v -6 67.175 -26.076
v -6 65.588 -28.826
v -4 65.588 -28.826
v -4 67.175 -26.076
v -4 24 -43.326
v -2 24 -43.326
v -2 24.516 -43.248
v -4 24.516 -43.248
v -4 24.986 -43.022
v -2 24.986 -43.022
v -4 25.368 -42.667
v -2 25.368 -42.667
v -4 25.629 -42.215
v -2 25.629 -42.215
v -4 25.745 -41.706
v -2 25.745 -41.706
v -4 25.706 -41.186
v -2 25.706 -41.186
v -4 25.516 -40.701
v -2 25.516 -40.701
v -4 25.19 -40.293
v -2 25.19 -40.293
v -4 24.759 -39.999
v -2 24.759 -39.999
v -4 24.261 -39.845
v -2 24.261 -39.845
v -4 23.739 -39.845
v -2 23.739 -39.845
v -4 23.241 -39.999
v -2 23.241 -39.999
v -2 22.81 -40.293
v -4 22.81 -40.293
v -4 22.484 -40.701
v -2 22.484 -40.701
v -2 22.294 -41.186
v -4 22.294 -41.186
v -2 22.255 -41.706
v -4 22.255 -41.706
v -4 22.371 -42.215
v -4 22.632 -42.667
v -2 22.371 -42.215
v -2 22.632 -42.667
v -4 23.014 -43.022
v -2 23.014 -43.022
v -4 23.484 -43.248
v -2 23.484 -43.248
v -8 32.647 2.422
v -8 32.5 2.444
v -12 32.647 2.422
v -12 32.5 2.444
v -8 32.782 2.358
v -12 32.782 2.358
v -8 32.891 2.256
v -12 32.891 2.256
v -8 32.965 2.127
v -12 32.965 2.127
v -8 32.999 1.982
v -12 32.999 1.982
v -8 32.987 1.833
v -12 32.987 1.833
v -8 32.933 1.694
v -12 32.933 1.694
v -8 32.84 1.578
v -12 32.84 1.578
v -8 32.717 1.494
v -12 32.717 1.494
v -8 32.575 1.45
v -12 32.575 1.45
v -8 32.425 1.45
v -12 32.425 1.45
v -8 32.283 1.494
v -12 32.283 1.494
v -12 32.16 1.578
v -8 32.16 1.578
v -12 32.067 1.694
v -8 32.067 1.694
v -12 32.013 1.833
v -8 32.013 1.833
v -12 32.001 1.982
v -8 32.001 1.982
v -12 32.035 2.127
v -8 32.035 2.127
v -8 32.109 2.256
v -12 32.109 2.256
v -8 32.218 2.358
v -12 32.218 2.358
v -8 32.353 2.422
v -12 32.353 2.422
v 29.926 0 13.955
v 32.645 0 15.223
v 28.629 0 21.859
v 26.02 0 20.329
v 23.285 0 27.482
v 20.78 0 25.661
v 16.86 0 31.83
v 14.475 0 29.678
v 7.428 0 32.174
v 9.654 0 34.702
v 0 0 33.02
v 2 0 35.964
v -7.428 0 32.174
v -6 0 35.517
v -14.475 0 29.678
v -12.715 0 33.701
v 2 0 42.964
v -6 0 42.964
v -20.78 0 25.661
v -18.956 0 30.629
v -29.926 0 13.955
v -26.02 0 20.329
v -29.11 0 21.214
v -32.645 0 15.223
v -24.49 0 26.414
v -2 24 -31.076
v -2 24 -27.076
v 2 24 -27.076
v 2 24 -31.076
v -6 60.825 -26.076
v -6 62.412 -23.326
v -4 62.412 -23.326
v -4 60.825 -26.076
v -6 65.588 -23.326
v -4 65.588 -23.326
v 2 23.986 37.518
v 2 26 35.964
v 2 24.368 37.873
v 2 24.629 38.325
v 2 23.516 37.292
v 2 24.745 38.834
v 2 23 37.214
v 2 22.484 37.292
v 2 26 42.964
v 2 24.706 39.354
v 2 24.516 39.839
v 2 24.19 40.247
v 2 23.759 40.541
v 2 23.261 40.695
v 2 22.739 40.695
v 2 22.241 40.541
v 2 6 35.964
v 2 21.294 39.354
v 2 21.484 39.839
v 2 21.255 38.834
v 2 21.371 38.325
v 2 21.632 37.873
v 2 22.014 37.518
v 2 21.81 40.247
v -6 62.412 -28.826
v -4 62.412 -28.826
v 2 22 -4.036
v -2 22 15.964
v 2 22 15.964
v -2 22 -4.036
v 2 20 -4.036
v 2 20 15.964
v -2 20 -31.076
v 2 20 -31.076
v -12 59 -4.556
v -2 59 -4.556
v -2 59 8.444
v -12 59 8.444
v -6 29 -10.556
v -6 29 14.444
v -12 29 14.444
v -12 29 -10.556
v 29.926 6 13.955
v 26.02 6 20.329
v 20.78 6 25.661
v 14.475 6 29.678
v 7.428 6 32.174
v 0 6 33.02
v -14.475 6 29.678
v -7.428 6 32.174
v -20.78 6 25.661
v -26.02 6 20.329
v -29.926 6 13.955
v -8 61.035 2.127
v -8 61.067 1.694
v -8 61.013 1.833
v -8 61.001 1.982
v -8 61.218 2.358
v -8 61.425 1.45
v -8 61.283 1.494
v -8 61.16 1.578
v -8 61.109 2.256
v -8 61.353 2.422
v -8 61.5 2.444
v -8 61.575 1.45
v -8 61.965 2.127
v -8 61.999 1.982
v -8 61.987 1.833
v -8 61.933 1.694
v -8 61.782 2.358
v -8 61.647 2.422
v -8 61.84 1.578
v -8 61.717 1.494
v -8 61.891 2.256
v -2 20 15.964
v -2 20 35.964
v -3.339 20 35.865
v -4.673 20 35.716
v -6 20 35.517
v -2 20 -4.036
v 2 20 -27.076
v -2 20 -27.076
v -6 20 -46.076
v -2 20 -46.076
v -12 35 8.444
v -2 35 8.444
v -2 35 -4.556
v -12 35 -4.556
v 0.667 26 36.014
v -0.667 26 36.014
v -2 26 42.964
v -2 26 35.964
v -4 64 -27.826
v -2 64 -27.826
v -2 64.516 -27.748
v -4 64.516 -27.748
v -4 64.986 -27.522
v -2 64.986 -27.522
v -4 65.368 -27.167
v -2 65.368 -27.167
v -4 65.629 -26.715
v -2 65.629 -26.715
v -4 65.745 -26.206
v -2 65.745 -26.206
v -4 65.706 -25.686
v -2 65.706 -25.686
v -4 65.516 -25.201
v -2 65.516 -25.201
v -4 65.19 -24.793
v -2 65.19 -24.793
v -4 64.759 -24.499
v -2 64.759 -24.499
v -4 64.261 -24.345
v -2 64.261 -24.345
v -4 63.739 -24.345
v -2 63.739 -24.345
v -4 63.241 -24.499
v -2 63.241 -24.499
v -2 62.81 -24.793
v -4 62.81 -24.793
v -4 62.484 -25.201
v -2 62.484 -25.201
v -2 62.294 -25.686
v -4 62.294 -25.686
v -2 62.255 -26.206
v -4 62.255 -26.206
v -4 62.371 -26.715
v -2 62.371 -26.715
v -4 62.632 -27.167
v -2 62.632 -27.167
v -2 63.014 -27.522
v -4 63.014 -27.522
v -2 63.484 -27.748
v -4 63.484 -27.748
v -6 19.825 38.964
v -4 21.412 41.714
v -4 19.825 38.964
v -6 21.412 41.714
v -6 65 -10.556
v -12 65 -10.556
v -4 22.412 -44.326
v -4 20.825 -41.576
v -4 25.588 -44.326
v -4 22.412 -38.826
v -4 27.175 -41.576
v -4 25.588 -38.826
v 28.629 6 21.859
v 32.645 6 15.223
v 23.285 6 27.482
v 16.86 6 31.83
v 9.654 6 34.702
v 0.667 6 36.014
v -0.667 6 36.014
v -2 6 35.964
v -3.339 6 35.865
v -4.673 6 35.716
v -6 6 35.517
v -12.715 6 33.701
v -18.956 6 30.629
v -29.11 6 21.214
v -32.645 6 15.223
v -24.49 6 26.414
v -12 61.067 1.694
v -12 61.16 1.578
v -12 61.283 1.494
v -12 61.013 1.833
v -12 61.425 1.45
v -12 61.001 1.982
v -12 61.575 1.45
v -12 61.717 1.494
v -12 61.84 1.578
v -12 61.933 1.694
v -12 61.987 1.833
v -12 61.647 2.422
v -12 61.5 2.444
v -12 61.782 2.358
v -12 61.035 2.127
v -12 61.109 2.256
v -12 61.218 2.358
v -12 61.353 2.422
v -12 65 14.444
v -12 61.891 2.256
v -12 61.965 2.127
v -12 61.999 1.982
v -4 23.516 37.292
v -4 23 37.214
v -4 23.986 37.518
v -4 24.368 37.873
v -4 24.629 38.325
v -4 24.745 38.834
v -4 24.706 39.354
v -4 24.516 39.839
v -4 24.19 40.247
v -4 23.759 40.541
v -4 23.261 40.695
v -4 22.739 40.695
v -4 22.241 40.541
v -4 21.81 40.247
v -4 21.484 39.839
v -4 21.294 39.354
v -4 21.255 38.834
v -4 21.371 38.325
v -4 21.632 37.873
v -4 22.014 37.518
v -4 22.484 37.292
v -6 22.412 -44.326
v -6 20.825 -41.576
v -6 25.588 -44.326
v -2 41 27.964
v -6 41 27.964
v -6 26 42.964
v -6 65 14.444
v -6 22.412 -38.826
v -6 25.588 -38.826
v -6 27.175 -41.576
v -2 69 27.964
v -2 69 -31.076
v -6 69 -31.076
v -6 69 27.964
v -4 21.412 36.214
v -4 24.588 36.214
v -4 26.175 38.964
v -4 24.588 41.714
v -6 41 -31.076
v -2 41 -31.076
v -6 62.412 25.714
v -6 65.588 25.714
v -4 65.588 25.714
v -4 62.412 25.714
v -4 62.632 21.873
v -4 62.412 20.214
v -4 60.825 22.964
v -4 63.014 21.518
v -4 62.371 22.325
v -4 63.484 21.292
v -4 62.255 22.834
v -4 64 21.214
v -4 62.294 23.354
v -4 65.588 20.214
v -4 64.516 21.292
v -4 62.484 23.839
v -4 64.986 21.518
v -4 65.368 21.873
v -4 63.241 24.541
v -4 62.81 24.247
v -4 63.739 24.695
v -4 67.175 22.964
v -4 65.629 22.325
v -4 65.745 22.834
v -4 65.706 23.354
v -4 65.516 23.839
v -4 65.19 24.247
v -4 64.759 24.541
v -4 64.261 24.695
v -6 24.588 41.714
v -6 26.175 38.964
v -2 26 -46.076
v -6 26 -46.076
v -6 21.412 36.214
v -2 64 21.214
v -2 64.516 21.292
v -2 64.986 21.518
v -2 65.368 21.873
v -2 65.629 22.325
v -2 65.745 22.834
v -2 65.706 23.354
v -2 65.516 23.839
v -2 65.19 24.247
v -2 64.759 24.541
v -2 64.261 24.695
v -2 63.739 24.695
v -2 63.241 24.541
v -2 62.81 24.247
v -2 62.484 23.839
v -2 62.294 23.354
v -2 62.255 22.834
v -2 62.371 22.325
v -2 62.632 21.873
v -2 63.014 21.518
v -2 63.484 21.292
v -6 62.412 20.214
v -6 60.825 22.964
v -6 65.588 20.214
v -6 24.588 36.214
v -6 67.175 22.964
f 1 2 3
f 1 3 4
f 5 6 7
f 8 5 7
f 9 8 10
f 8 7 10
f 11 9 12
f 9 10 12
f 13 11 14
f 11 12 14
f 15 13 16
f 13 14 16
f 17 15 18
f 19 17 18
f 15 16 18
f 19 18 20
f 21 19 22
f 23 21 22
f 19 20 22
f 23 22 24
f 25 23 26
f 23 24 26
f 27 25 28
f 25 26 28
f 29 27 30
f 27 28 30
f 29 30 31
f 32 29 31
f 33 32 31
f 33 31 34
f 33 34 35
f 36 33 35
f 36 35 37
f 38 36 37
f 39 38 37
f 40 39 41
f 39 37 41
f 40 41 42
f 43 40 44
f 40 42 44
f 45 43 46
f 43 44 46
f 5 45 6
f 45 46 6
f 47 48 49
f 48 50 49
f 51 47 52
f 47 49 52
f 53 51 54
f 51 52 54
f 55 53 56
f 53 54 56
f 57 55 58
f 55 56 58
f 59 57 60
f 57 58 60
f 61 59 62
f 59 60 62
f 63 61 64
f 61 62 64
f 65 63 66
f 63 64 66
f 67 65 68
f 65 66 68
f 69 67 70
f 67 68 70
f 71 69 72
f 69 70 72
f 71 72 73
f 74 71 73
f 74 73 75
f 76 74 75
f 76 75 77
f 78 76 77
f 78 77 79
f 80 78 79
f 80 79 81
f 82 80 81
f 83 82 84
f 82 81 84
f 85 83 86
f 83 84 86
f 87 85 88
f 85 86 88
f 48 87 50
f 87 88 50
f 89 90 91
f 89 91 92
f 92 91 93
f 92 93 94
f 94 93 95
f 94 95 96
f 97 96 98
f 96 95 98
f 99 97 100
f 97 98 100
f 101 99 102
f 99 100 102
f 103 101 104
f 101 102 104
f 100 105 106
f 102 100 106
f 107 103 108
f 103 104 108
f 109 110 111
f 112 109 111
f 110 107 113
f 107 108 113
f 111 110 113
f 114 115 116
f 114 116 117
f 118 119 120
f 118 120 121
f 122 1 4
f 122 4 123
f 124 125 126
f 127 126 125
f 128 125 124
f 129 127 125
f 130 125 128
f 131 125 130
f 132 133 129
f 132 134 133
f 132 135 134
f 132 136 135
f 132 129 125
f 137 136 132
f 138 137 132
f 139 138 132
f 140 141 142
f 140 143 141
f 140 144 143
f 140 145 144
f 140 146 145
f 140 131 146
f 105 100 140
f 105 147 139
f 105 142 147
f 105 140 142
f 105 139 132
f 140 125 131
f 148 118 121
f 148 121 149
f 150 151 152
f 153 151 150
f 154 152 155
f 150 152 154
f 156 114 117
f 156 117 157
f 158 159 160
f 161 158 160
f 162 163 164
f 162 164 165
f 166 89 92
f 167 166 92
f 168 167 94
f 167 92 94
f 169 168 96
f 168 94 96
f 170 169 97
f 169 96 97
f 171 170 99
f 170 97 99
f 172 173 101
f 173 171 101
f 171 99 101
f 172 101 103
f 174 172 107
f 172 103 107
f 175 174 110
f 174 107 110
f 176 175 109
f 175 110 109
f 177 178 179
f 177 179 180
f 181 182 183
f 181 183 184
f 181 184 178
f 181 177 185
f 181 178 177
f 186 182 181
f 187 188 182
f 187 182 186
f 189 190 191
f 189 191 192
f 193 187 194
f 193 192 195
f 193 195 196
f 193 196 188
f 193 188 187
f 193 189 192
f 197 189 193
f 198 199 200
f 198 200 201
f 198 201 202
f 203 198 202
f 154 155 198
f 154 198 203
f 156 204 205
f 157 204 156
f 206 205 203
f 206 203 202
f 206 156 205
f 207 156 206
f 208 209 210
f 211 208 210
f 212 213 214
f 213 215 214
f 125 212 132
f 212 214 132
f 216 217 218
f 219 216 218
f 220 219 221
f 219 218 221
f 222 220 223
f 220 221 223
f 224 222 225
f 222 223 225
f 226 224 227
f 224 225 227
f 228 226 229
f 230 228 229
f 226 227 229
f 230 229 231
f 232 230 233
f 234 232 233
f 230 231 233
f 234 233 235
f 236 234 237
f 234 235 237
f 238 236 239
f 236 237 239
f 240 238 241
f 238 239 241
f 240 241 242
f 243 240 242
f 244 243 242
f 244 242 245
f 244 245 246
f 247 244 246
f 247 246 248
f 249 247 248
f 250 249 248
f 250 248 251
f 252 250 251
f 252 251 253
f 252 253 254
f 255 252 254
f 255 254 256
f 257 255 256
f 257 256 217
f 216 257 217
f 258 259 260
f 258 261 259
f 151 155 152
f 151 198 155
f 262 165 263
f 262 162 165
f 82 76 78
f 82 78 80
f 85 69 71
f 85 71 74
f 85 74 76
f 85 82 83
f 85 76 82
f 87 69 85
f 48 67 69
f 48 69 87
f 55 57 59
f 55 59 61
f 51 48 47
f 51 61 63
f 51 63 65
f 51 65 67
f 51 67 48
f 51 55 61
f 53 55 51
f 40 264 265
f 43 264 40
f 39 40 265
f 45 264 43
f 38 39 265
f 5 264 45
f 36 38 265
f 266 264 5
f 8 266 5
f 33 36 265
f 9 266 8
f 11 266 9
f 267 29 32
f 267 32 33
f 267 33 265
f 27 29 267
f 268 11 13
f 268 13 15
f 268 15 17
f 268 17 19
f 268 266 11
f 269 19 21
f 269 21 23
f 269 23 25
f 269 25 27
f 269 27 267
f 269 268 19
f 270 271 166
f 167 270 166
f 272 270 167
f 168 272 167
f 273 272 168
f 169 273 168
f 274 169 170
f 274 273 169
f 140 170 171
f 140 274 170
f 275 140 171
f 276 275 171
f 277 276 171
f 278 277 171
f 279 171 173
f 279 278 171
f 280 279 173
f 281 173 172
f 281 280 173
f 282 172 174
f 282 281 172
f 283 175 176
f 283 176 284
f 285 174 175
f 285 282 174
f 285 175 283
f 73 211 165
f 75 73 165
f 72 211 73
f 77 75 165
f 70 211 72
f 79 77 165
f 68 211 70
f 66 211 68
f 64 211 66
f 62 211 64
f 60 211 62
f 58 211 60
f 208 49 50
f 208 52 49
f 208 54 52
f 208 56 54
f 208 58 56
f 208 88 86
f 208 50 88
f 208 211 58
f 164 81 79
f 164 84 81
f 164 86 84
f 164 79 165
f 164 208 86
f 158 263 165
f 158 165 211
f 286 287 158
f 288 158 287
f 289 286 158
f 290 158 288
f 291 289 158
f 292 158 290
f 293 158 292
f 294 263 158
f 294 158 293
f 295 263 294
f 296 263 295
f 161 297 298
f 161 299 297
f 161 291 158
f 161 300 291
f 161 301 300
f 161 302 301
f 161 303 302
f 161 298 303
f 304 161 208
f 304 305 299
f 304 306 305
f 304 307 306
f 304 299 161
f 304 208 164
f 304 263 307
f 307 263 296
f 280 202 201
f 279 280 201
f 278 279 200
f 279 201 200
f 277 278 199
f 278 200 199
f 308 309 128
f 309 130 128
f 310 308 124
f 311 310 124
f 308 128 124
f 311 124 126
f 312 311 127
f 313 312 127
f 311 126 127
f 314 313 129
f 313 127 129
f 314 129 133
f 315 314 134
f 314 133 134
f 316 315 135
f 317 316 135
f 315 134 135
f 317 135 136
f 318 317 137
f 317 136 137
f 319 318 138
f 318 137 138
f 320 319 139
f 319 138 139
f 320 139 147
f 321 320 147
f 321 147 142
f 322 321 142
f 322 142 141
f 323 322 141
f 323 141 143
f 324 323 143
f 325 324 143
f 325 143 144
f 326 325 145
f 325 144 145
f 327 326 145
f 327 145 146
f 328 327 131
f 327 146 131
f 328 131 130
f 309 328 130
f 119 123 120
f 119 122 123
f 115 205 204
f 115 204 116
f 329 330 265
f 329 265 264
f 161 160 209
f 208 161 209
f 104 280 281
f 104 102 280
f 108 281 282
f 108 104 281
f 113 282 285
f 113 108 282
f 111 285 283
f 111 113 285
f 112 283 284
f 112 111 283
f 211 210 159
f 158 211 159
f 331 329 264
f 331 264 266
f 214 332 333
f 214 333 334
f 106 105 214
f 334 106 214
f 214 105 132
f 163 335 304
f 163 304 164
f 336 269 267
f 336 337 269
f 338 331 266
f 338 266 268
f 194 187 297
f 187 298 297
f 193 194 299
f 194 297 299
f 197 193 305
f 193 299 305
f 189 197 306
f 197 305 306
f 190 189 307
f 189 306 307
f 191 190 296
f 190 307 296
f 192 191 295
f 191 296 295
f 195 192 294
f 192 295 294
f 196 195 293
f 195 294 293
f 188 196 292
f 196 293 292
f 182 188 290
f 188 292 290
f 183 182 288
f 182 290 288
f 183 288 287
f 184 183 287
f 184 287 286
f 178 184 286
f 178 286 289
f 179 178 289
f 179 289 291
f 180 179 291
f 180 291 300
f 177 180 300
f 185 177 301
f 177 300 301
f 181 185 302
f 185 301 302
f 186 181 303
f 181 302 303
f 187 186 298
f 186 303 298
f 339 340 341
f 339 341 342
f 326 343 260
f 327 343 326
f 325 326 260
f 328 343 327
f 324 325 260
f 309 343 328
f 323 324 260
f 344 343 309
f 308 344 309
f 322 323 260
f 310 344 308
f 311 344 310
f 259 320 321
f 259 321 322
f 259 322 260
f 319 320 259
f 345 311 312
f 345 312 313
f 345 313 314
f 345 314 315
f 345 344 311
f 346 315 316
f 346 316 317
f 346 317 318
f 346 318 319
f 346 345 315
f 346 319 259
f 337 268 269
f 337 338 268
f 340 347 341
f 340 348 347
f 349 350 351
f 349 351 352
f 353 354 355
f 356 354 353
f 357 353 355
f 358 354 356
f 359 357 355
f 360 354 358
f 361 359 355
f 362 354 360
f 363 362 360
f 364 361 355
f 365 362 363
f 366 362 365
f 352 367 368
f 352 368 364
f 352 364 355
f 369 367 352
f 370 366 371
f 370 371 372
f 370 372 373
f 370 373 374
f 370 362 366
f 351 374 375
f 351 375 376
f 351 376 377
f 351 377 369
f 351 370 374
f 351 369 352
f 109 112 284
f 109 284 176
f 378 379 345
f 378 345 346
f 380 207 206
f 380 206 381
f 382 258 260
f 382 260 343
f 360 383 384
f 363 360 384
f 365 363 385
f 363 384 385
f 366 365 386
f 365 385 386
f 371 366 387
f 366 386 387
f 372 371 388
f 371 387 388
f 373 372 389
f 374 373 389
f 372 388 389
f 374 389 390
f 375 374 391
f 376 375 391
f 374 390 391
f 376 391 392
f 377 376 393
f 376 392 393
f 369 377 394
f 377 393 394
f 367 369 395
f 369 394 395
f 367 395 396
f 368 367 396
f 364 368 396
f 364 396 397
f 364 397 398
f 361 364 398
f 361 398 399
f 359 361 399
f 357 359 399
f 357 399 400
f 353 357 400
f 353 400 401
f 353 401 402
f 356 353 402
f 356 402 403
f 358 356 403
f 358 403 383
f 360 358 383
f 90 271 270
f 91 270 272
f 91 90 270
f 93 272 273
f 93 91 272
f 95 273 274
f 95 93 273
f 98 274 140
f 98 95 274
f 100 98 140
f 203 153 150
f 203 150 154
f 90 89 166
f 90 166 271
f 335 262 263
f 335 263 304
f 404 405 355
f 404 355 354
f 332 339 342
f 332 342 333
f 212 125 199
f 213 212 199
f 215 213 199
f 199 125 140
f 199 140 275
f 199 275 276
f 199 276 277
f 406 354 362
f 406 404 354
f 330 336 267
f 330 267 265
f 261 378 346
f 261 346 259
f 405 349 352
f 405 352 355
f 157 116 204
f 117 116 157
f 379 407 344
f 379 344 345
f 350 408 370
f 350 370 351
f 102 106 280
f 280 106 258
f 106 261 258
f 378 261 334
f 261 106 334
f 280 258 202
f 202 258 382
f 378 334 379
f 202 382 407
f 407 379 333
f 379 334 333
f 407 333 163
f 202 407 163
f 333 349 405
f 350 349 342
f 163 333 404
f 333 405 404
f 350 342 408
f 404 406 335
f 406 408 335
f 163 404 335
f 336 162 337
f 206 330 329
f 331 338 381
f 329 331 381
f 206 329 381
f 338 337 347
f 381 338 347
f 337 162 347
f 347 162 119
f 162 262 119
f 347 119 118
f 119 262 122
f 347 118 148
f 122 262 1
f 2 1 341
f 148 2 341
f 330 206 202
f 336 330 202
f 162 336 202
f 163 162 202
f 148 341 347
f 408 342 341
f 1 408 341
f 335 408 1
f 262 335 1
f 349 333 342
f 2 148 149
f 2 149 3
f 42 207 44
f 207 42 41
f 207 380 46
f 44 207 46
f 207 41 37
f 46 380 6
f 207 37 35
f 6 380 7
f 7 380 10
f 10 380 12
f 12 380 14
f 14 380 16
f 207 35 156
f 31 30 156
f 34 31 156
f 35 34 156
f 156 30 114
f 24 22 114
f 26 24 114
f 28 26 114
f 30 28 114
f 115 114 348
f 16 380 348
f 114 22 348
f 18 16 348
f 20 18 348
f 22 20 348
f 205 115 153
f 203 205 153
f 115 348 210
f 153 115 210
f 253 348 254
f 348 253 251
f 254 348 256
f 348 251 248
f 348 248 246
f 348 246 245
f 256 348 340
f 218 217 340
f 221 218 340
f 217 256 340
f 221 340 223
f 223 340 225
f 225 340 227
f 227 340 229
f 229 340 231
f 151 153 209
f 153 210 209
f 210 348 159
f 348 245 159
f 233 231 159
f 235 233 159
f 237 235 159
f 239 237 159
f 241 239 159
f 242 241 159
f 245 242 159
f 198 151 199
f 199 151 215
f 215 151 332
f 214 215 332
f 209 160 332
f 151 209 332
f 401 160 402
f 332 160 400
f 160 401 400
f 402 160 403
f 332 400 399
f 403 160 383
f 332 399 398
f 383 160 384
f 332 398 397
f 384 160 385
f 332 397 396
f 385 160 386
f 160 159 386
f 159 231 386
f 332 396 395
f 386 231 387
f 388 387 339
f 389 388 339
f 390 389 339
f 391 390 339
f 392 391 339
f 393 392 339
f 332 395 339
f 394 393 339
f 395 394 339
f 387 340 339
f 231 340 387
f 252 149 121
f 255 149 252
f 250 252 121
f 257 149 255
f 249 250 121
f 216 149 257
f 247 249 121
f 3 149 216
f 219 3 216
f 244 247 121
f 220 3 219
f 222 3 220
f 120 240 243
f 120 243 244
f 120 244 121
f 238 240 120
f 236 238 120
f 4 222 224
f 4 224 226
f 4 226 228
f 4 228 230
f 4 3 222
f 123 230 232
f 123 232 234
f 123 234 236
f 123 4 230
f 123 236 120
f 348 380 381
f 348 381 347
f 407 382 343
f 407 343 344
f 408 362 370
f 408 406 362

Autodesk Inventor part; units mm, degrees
ref_plane "YZ Plane" through (0, 0, 0) normal (1, 0, 0) x (0, 1, 0)
ref_plane "XZ Plane" through (0, 0, 0) normal (0, 1, 0) x (-1, 0, 0)
ref_plane "XY Plane" through (0, 0, 0) normal (0, 0, 1) x (1, 0, 0)
sketch "Sketch1" plane through (0, 0, 0) normal (0, 1, 0) x (-1, 0, 0)
  line L0 (32.6452, 15.2227) -> (29.9263, 13.9549)
  line L1 (-29.9263, 13.9549) -> (-32.6452, 15.2227)
  line L2 (36.02, 0) -> (-36.02, 0) construction
  arc A0 (29.9263, 13.9549) -> (-29.9263, 13.9549) centre (0, 0) ccw
  arc A1 (32.6452, 15.2227) -> (-32.6452, 15.2227) centre (0, 0) ccw
  dimension "d2" = 25
  dimension "d3" = 25
extrude "Extrusion1" add sketch "Sketch1" along normal blind 6
sketch "Sketch2" plane through (0, 0, 0) normal (0, -1, 0) x (1, 0, 0)
  arc A0 (32.6452, 15.2227) -> (-32.6452, 15.2227) centre (0, 0) ccw projected
  line L0 (2, 35.9644) -> (2, 42.9644)
  line L1 (2, 42.9644) -> (-2, 42.9644)
  line L2 (-2, 42.9644) -> (-2, 35.9644)
  dimension "d6" = 2
  dimension "d7" = 2
  dimension "d8" = 7
extrude "Extrusion2" add sketch "Sketch2" against normal blind 26
sketch "Sketch3" plane through (-2, 0, 35.9644) normal (-1, 0, 0) x (0, 0, 1)
  line L0 (7, 0) -> (7, 26) projected
  line L1 (7, 20) -> (-82.04, 20)
  line L2 (-82.04, 20) -> (-82.04, 26)
  line L3 (-82.04, 26) -> (-67.04, 41)
  line L4 (-67.04, 41) -> (-67.04, 69)
  line L5 (-67.04, 69) -> (-8, 69)
  line L6 (-8, 69) -> (-8, 41)
  line L7 (-8, 41) -> (7, 26)
  line L8 (-40.52, 59) -> (-27.52, 59)
  line L9 (-27.52, 59) -> (-27.52, 35)
  line L10 (-27.52, 35) -> (-40.52, 35)
  line L11 (-40.52, 35) -> (-40.52, 59)
  line L12 (7, 0) -> (0, 0) projected
  point P0 (-35.9644, 0)
  dimension "d11" = 15
  dimension "d12" = 15
  dimension "d13" = 89.04
  dimension "d14" = 24
  dimension "d15" = 13
  dimension "d16" = 19.52
  dimension "d17" = 10
  dimension "d18" = 15
  dimension "d19" = 15
  dimension "d20" = 15
  dimension "d21" = 20
  dimension "d22" = 6
extrude "Extrusion3" add sketch "Sketch3" along normal blind 4
sketch "Sketch4" plane through (-6, 0, 35.9644) normal (-1, 0, 0) x (0, 0, 1)
  line L0 (-40.52, 35) -> (-40.52, 59) projected
  line L1 (-27.52, 35) -> (-40.52, 35) projected
  line L2 (-27.52, 59) -> (-27.52, 35) projected
  line L3 (-40.52, 59) -> (-27.52, 59) projected
  line L4 (-46.52, 29) -> (-46.52, 65)
  line L5 (-46.52, 65) -> (-21.52, 65)
  line L6 (-21.52, 65) -> (-21.52, 29)
  line L7 (-21.52, 29) -> (-46.52, 29)
  point P0 (-35.9644, 0)
  dimension "d49" = 6
extrude "Extrusion4" add sketch "Sketch4" along normal blind 6
sketch "Sketch5" plane through (-2, 20, -46.0756) normal (0, -1, 0) x (1, 0, 0)
  line L0 (0, 82.04) -> (0, 89.04) projected
  line L1 (0, 82.04) -> (0, 89.04)
  line L2 (0, 89.04) -> (-4, 89.04) projected
  line L3 (0, 89.04) -> (-4, 89.04)
  line L4 (-4, 89.04) -> (-4, 81.54)
  line L5 (-4, 89.04) -> (-4, 74.04) projected
  arc A0 (0, 82.04) -> (-30.6452, 61.2983) centre (2, 46.0756) ccw projected
  point P0 (-4, 81.5923)
extrude "Extrusion5" add sketch "Sketch5" along normal up to surface (20 mm away)
sketch "Sketch6" plane through (-2, 0, 35.9644) normal (1, 0, 0) x (0, 0, -1)
  circle A0 centre (77.54, 24) radius 1.75
  circle A1 centre (62.04, 64) radius 1.75
  circle A2 centre (13, 64) radius 1.75
  line L0 (8, 69) -> (67.04, 69) projected
  line L1 (67.04, 69) -> (67.04, 41) projected
  line L2 (8, 41) -> (8, 69) projected
  line L3 (82.04, 20) -> (0, 20) projected
  line L4 (82.04, 26) -> (82.04, 20) projected
  point P0 (35.9644, 0)
  dimension "d36" = 3.5
  dimension "d37" = 3.5
  dimension "d38" = 3.5
  dimension "d40" = 5
  dimension "d41" = 5
  dimension "d42" = 5
  dimension "d43" = 5
  dimension "d44" = 4
  dimension "d45" = 4.5
extrude "Extrusion6" cut sketch "Sketch6" against normal blind 6
sketch "Sketch7" plane through (2, 0, 42.9644) normal (1, 0, 0) x (0, 0, -1)
  circle A0 centre (4, 23) radius 1.75
  line L0 (0, 0) -> (0, 26) projected
  line L1 (0, 26) -> (7, 26) projected
  point P0 (42.9644, 0)
  dimension "d50" = 3.5
  dimension "d51" = 4
  dimension "d52" = 3
extrude "Extrusion7" cut sketch "Sketch7" against normal through all
sketch "Sketch8" plane through (-2, 0, 35.9644) normal (1, 0, 0) x (0, 0, -1)
  line L0 (82.04, 20) -> (0, 20) projected
  line L1 (20, 22) -> (40, 22)
  line L2 (40, 22) -> (40, 20)
  line L3 (40, 20) -> (20, 20)
  line L4 (20, 20) -> (20, 22)
  line L5 (0, 6) -> (0, 26) projected
  line L6 (67.04, 20) -> (63.04, 20)
  line L7 (63.04, 20) -> (63.04, 24)
  line L8 (63.04, 24) -> (67.04, 24)
  line L9 (67.04, 24) -> (67.04, 20)
  line L10 (82.04, 26) -> (82.04, 20) projected
  point P0 (35.9644, 0)
  dimension "d55" = 2
  dimension "d56" = 20
  dimension "d57" = 20
  dimension "d60" = 4
  dimension "d61" = 4
  dimension "d62" = 15
extrude "Extrusion8" add sketch "Sketch8" along normal blind 4
sketch "Sketch10" plane through (-6, 0, 35.9644) normal (-1, 0, 0) x (0, 0, 1)
  circle A0 centre (-62.04, 64) radius 1.75 projected
  circle A1 centre (-13, 64) radius 1.75 projected
  circle A2 centre (-77.54, 24) radius 1.75 projected
  circle A3 centre (3, 23) radius 1.75 projected
  line L0 (-62.04, 60.8246) -> (-64.79, 62.4123)
  line L1 (-64.79, 62.4123) -> (-64.79, 65.5877)
  line L2 (-64.79, 65.5877) -> (-62.04, 67.1754)
  line L3 (-62.04, 67.1754) -> (-59.29, 65.5877)
  line L4 (-59.29, 65.5877) -> (-59.29, 62.4123)
  line L5 (-59.29, 62.4123) -> (-62.04, 60.8246)
  line L6 (-13, 60.8246) -> (-15.75, 62.4123)
  line L7 (-15.75, 62.4123) -> (-15.75, 65.5877)
  line L8 (-15.75, 65.5877) -> (-13, 67.1754)
  line L9 (-13, 67.1754) -> (-10.25, 65.5877)
  line L10 (-10.25, 65.5877) -> (-10.25, 62.4123)
  line L11 (-10.25, 62.4123) -> (-13, 60.8246)
  line L12 (-74.79, 25.5877) -> (-74.79, 22.4123)
  line L13 (-74.79, 22.4123) -> (-77.54, 20.8246)
  line L14 (-77.54, 20.8246) -> (-80.29, 22.4123)
  line L15 (-80.29, 22.4123) -> (-80.29, 25.5877)
  line L16 (-80.29, 25.5877) -> (-77.54, 27.1754)
  line L17 (-77.54, 27.1754) -> (-74.79, 25.5877)
  circle A4 centre (3, 23) radius 1.75 projected
  line L18 (0.25, 24.5877) -> (3, 26.1754)
  line L19 (3, 26.1754) -> (5.75, 24.5877)
  line L20 (5.75, 24.5877) -> (5.75, 21.4123)
  line L21 (5.75, 21.4123) -> (3, 19.8246)
  line L22 (3, 19.8246) -> (0.25, 21.4123)
  line L23 (0.25, 21.4123) -> (0.25, 24.5877)
  line L24 (-67.04, 69) -> (-67.04, 41) projected
  line L25 (-8, 41) -> (-8, 69) projected
  line L26 (7, 26) -> (7, 0) projected
  line L27 (-82.04, 26) -> (-82.04, 20) projected
  point P0 (-35.9644, 0)
  dimension "d63" = 5.5
  dimension "d64" = 5.5
  dimension "d65" = 5.5
  dimension "d66" = 5.5
extrude "Extrusion9" cut sketch "Sketch10" against normal blind 2 contours A3 | L0 L1 L2 L3 L4 L5 | L6 L7 L8 L9 L10 L11 | L12 L13 L14 L15 L16 L17 | L18 L19 L20 L21 L22 L23
sketch "Sketch11" plane through (-12, 0, 35.9644) normal (-1, 0, 0) x (0, 0, 1)
  circle A0 centre (-34.02, 32.5) radius 0.5
  circle A1 centre (-34.02, 61.5) radius 0.5
  line L0 (-40.52, 59) -> (-27.52, 59) projected
  line L1 (-27.52, 35) -> (-40.52, 35) projected
  line L2 (-21.52, 29) -> (-21.52, 65) projected
  point P0 (-35.9644, 0)
  dimension "d69" = 2.5
  dimension "d70" = 2.5
  dimension "d71" = 12.5
  dimension "d72" = 12.5
  dimension "d73" = 1
  dimension "d74" = 1
extrude "Extrusion10" cut sketch "Sketch11" against normal blind 4
equation "\"d3\" = d2"
equation "\"d7\" = d6"
equation "\"d12\" = d11"
equation "\"d20\" = d19"
equation "\"d37\" = d36"
equation "\"d38\" = d36"
properties part number "_3DPrint"
